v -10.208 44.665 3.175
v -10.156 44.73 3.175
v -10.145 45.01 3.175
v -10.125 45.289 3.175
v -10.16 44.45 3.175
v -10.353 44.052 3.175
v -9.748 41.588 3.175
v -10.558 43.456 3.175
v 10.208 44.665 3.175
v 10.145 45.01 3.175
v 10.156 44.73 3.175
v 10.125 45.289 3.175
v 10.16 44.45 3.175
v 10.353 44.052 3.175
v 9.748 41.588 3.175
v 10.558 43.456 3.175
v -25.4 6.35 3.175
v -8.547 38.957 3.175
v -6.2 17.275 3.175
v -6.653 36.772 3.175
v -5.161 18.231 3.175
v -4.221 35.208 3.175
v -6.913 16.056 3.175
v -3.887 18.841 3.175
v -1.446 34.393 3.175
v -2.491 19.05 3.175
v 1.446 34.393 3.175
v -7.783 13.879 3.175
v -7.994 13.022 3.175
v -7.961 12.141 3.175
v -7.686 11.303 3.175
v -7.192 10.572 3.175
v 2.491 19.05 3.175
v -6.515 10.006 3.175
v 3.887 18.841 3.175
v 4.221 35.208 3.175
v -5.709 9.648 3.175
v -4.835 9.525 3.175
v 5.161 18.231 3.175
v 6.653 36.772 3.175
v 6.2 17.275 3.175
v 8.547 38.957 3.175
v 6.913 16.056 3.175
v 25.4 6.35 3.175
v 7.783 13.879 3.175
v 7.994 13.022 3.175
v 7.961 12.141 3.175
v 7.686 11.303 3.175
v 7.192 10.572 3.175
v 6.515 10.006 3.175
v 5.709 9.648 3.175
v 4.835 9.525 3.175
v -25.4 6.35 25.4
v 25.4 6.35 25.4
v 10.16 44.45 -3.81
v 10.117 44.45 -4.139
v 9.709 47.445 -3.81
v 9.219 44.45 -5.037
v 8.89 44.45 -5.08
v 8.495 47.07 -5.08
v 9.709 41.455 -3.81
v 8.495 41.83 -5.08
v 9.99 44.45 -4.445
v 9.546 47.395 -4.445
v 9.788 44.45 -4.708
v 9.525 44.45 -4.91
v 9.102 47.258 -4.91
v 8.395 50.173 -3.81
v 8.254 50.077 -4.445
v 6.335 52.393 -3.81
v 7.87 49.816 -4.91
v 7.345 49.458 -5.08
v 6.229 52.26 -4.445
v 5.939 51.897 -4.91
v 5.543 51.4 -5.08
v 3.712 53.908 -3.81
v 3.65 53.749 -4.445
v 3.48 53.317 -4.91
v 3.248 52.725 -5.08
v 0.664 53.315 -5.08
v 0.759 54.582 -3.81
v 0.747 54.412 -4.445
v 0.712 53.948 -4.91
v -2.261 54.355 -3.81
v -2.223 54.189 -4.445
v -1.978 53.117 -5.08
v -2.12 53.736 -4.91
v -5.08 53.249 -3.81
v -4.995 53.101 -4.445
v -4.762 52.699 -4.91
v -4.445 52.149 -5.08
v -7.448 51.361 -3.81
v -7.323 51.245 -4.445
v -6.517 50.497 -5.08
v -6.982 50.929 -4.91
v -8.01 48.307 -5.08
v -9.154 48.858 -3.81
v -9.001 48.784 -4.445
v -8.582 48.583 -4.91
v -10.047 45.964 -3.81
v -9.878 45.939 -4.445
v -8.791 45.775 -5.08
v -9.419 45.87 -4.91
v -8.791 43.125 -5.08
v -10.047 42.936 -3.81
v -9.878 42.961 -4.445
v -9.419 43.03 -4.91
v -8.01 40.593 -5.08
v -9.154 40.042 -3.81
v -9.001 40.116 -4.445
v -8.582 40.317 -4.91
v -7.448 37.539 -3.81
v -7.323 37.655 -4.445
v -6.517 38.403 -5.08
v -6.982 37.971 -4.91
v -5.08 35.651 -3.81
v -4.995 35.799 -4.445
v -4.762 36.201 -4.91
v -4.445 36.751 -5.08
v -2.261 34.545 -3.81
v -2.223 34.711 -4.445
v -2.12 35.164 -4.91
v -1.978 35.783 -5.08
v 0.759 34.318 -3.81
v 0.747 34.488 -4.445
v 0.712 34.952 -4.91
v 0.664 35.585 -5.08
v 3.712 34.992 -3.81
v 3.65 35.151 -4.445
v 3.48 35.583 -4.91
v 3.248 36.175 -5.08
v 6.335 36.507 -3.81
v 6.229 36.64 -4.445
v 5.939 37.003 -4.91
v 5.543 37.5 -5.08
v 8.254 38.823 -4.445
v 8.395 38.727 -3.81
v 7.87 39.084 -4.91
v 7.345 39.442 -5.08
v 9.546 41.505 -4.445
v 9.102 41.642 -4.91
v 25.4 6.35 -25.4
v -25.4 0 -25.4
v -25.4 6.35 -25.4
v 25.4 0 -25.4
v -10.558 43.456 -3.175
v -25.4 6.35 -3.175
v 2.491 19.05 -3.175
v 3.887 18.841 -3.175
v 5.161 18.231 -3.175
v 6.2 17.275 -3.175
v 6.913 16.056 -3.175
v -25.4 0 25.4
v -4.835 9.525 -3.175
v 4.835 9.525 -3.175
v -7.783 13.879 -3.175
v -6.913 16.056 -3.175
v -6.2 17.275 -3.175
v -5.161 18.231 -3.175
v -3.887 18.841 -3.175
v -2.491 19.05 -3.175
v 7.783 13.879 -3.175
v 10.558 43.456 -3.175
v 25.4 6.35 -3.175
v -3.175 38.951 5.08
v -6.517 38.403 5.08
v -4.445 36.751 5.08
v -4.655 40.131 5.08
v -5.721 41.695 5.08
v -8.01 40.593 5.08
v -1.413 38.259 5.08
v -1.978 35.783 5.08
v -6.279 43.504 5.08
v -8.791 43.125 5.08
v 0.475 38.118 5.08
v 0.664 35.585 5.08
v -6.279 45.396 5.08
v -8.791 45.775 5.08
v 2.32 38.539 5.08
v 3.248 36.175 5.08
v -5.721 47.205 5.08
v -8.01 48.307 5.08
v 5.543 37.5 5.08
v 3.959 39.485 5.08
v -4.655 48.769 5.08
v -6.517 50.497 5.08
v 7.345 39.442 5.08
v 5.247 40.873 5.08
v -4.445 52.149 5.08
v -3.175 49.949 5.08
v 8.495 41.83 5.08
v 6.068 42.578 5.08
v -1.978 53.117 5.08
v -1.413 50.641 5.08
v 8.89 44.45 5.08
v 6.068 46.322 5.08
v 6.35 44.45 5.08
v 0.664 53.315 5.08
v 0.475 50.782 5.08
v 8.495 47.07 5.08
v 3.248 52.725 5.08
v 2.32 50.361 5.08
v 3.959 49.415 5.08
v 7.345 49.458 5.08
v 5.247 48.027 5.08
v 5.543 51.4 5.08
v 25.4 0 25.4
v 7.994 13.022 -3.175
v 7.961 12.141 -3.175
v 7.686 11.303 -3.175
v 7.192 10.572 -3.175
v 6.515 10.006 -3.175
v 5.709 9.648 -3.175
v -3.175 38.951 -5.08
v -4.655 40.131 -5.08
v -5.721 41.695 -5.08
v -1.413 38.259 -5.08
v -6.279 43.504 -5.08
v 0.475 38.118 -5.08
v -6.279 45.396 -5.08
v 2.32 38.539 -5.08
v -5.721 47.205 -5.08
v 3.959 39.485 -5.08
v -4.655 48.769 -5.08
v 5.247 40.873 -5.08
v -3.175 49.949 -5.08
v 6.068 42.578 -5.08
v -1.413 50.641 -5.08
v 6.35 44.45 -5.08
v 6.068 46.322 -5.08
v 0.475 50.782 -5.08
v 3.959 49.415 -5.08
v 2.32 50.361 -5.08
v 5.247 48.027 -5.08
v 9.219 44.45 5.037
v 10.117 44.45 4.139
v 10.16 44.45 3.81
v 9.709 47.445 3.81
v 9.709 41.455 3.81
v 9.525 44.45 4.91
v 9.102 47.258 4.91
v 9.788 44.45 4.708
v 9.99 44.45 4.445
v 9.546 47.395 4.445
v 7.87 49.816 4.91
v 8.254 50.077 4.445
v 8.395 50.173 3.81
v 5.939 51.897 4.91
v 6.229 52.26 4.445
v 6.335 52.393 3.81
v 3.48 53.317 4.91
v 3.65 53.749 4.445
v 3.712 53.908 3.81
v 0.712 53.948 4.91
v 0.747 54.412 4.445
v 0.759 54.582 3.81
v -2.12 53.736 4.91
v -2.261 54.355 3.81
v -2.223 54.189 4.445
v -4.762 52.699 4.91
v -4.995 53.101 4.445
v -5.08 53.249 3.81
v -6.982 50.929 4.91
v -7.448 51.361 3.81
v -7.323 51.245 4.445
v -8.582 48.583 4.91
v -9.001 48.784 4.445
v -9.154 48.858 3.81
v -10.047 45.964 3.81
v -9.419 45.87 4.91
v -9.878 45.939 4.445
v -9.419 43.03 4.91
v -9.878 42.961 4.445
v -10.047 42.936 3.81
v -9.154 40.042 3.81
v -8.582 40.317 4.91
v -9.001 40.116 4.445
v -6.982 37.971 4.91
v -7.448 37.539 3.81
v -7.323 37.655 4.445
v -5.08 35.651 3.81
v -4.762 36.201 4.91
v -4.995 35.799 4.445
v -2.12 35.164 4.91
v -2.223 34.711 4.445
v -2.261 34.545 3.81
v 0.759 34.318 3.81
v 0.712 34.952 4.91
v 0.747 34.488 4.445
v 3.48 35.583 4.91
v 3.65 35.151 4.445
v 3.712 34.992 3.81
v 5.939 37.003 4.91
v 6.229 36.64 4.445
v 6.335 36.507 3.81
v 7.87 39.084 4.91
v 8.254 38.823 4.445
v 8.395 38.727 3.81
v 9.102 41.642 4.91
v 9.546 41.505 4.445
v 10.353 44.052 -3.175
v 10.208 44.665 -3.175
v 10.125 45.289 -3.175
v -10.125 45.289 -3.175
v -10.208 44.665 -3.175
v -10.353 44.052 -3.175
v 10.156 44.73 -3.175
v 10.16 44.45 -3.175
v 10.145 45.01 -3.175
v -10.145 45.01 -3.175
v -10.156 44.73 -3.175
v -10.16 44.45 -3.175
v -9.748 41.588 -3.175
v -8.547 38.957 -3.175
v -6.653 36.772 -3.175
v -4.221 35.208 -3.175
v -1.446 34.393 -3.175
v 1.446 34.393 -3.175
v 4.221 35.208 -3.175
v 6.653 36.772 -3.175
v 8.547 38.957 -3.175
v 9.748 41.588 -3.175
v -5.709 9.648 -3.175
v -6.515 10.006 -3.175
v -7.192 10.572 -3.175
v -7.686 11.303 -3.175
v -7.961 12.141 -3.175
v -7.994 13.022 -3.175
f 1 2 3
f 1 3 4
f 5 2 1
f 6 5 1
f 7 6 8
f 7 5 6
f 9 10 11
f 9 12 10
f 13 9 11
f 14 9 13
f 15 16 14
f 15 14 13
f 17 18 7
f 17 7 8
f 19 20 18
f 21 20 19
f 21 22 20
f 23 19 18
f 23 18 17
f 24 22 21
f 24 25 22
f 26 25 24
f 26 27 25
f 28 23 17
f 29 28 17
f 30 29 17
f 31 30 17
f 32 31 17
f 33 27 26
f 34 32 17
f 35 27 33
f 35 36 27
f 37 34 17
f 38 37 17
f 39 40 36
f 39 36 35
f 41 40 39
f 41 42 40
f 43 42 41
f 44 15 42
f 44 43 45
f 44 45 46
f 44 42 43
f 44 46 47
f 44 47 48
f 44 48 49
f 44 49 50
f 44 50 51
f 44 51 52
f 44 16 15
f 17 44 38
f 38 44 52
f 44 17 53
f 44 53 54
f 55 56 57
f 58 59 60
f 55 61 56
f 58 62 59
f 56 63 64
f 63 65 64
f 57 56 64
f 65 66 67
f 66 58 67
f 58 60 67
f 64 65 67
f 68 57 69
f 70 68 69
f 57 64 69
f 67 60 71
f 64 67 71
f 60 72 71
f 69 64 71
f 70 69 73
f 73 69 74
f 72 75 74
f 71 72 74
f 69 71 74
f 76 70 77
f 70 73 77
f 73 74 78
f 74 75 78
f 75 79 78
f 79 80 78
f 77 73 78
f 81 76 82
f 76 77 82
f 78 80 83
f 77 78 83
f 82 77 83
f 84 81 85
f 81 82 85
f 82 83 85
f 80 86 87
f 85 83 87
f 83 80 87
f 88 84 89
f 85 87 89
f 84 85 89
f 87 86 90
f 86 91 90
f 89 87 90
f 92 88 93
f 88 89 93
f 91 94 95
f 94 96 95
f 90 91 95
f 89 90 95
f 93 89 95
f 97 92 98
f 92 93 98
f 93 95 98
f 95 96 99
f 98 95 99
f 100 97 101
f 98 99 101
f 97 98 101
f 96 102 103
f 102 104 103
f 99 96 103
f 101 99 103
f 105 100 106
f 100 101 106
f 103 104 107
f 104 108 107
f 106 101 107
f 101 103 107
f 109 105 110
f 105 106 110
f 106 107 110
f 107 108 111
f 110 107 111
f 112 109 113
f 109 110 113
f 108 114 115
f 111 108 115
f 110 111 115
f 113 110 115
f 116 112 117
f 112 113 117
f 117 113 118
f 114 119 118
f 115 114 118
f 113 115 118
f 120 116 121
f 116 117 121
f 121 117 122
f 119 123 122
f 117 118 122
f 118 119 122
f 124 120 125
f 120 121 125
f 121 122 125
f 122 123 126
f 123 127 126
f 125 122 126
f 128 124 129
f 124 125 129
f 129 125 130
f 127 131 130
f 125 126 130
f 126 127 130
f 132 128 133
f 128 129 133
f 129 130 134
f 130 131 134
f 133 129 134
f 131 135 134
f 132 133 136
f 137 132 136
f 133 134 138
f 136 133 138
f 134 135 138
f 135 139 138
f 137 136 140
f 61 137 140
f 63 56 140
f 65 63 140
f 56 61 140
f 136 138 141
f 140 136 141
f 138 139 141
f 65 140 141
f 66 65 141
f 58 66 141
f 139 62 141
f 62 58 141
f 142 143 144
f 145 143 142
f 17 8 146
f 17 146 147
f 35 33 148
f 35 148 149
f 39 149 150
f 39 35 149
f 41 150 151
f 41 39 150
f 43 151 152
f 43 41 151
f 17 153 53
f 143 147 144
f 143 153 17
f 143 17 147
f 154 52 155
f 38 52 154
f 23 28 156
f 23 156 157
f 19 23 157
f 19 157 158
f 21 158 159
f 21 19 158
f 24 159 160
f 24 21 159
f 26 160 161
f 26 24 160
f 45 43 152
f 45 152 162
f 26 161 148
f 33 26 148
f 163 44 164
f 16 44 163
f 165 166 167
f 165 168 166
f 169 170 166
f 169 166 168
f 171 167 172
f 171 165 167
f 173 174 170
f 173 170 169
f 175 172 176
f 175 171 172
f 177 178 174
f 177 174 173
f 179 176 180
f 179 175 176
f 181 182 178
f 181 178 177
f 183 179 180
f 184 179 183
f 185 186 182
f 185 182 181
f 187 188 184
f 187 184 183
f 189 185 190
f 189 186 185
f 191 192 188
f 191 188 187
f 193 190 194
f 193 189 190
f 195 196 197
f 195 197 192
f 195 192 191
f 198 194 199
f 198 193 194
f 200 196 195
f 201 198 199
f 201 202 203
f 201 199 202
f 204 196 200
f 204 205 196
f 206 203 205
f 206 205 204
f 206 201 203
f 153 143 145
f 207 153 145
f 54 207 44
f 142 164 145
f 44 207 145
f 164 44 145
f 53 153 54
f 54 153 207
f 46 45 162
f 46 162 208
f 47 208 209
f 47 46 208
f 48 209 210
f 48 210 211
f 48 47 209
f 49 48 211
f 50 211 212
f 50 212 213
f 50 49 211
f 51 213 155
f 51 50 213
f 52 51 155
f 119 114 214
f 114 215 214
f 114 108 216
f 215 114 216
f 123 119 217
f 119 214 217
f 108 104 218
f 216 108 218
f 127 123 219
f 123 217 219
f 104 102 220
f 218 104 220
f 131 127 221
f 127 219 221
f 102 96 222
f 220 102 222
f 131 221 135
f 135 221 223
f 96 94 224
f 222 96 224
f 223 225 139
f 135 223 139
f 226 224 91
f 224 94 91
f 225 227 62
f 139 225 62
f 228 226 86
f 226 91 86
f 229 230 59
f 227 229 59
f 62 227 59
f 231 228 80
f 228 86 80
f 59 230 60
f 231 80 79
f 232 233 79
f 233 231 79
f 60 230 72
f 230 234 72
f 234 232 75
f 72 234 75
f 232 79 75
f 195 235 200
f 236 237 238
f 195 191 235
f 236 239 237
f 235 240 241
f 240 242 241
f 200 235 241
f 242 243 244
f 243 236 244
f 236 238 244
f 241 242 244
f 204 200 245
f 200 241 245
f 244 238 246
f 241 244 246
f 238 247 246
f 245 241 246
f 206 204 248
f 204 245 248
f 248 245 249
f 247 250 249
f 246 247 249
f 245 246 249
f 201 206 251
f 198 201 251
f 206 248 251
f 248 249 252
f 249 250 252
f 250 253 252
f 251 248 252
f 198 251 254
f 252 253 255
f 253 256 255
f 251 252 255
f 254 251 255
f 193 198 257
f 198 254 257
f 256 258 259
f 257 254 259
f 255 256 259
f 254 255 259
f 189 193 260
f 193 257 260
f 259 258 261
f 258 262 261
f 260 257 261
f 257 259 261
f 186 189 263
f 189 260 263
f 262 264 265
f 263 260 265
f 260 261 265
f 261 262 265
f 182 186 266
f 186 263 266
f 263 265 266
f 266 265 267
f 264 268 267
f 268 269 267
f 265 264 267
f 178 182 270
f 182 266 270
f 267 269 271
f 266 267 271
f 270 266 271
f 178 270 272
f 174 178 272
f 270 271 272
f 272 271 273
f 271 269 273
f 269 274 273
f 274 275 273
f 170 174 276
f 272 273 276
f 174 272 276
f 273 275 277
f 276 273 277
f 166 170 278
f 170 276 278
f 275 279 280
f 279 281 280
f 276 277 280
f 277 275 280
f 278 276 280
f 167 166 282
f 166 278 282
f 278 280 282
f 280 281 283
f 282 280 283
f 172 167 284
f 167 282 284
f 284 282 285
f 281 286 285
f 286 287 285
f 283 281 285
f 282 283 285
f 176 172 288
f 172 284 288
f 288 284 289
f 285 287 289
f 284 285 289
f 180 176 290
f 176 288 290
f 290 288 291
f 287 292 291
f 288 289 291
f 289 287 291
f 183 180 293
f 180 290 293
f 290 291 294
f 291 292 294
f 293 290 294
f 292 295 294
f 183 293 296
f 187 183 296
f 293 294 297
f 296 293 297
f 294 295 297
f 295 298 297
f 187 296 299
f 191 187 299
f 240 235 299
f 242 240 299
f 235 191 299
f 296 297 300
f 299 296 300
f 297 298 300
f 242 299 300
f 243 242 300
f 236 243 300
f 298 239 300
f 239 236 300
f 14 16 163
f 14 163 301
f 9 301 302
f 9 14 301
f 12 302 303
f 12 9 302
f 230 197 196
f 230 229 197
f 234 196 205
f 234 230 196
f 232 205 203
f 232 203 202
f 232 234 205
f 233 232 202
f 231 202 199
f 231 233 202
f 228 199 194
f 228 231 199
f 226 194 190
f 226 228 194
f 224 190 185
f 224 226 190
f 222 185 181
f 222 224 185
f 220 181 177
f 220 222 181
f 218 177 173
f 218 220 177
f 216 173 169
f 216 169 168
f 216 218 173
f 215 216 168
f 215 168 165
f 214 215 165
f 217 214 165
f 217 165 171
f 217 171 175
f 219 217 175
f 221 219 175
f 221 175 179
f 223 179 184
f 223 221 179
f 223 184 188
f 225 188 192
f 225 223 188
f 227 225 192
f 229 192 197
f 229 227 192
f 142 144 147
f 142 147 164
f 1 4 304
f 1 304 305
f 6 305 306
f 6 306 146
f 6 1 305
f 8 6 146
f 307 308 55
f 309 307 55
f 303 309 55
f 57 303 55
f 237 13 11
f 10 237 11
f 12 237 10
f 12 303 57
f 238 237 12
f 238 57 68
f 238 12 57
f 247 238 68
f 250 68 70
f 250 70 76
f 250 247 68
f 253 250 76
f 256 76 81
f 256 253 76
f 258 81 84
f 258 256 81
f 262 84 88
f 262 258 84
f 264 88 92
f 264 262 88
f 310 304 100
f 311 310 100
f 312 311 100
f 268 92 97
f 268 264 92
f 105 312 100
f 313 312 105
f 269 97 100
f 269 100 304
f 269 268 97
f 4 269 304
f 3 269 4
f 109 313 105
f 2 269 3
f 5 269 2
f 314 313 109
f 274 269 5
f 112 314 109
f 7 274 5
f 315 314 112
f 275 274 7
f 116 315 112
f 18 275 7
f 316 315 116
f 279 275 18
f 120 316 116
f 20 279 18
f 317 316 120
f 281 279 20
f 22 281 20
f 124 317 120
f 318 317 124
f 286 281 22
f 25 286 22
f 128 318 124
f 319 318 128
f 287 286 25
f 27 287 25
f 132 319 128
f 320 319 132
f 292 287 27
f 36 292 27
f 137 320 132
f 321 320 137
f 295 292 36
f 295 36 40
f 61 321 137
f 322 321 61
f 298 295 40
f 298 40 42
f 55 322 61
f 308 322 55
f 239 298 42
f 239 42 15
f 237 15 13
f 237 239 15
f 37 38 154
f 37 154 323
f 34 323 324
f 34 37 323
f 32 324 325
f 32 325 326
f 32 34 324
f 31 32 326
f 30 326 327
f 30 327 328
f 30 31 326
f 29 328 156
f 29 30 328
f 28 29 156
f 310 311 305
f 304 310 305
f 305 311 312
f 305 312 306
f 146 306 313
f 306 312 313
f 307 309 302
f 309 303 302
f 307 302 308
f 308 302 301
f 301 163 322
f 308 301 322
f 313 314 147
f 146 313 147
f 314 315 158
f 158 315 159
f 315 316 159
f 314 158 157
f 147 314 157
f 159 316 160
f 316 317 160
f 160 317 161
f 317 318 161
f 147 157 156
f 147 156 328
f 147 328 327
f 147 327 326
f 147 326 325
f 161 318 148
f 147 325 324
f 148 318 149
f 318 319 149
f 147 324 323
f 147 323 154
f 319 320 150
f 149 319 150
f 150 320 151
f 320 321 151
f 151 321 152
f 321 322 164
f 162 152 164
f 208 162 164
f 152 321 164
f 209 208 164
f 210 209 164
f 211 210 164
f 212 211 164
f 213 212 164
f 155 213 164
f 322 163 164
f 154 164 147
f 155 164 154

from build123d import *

# Parameters (mm, degrees)
SKETCH1_W           = 50.8
SKETCH1_H           = 50.8
BOSS_EXTRUDE1_DEPTH = 6.35
SKETCH2_R           = 10.16
SKETCH2_R_2         = 6.35
BOSS_EXTRUDE2_DEPTH = 5.08
BOSS_EXTRUDE3_DEPTH = 3.175
FILLET3_R           = 6.35
CUT_EXTRUDE1_DEPTH  = 6.35


with BuildPart() as part:
    # Sketch1 → Boss-Extrude1 (new body)
    with BuildSketch(Plane(origin=(0, 0, 0), x_dir=(1, 0, 0), z_dir=(0, 1, 0))):
        Rectangle(SKETCH1_W, SKETCH1_H)
    extrude(amount=BOSS_EXTRUDE1_DEPTH)



with BuildPart() as body_2:
    # Sketch2 → Boss-Extrude2 (new, symmetric)
    with BuildSketch(Plane.XY):
        with Locations((0, 44.45)):
            Circle(SKETCH2_R)
        with Locations((0, 44.45)):
            Circle(SKETCH2_R_2, mode=Mode.SUBTRACT)
    extrude(amount=BOSS_EXTRUDE2_DEPTH, both=True)


with BuildPart() as part_1:
    add(part.part)

    add(body_2.part)  # Boss-Extrude3 merges body 2
    # Sketch4 → Boss-Extrude3 (add, symmetric)
    with BuildSketch(Plane.XY):
        with BuildLine():
            Line((-10.16, 44.45), (-25.4, 6.35))
            Line((-25.4, 6.35), (25.4, 6.35))
            Line((25.4, 6.35), (10.16, 44.45))
            ThreePointArc((10.16, 44.45), (0, 34.29), (-10.16, 44.45))
        make_face()
    extrude(amount=BOSS_EXTRUDE3_DEPTH, both=True)

    # Fillet2: read off the stored shape, not the designer's step
    # Fillet2 outline → Fillet2 (revolve, cut)
    with BuildSketch(Plane.XZ.offset(-44.45)):
        with BuildLine():
            ThreePointArc((10.16, -3.81), (9.788025612, -4.708025612), (8.89, -5.08))
            Line((8.89, -5.08), (10.16, -5.08))
            Line((10.16, -5.08), (10.16, -3.81))
        make_face()
        with BuildLine():
            ThreePointArc((8.89, 5.08), (9.788025612, 4.708025612), (10.16, 3.81))
            Line((10.16, 3.81), (10.16, 5.08))
            Line((10.16, 5.08), (8.89, 5.08))
        make_face()
    revolve(axis=Axis((0, 44.45, 0), (0, 0, 1)), mode=Mode.SUBTRACT)

    # Fillet3
    # the kernel refuses this fillet: 6.35 mm, written as the material it adds along each edge
    with BuildSketch(Plane(origin=(10.16, 44.45, 3.175), x_dir=(-0.041343675933645734, 0.9991449847045691, 0), z_dir=(0, 0, -1))) as fillet3_piece_1:
        with BuildLine():
            CenterArc((1.102635837, 6.344570653), FILLET3_R, 250.56808401, 17.062422493)
            Line((-1.009923388, 0.356282624), (0, 0))
            ThreePointArc((0, 0), (0.420051747, 0.008686955), (0.840103495, 0))
        make_face()
    extrude(amount=6.35)
    with BuildSketch(Plane(origin=(-10.16, 44.45, 3.175), x_dir=(0.04134367593364538, 0.9991449847045691, 0), z_dir=(0, 0, -1))) as fillet3_piece_2:
        with BuildLine():
            CenterArc((1.102635837, -6.344570653), FILLET3_R, 92.369493497, 17.062422493)
            Line((-1.009923388, -0.356282624), (0, 0))
            ThreePointArc((0, 0), (0.420051747, -0.008686955), (0.840103495, 0))
        make_face()
    extrude(amount=6.35)

    # Sketch6 → Cut-Extrude1 (cut)
    with BuildSketch(Plane.XY.offset(3.175)):
        with BuildLine():
            Line((-2.490630521, 19.05), (2.490630521, 19.05))
            ThreePointArc((2.490630521, 19.05), (5.160625226, 18.231170185), (6.912500762, 16.056248096))
            Line((6.912500762, 16.056248096), (7.783333841, 13.879165397))
            ThreePointArc((7.783333841, 13.879165397), (7.464533804, 10.92000353), (4.835420347, 9.525))
            Line((4.835420347, 9.525), (-4.835420347, 9.525))
            ThreePointArc((-4.835420347, 9.525), (-7.464533804, 10.92000353), (-7.783333841, 13.879165397))
            Line((-7.783333841, 13.879165397), (-6.912500762, 16.056248096))
            ThreePointArc((-6.912500762, 16.056248096), (-5.160625226, 18.231170185), (-2.490630521, 19.05))
        make_face()
    extrude(amount=-CUT_EXTRUDE1_DEPTH, mode=Mode.SUBTRACT)


solid = part_1.part
